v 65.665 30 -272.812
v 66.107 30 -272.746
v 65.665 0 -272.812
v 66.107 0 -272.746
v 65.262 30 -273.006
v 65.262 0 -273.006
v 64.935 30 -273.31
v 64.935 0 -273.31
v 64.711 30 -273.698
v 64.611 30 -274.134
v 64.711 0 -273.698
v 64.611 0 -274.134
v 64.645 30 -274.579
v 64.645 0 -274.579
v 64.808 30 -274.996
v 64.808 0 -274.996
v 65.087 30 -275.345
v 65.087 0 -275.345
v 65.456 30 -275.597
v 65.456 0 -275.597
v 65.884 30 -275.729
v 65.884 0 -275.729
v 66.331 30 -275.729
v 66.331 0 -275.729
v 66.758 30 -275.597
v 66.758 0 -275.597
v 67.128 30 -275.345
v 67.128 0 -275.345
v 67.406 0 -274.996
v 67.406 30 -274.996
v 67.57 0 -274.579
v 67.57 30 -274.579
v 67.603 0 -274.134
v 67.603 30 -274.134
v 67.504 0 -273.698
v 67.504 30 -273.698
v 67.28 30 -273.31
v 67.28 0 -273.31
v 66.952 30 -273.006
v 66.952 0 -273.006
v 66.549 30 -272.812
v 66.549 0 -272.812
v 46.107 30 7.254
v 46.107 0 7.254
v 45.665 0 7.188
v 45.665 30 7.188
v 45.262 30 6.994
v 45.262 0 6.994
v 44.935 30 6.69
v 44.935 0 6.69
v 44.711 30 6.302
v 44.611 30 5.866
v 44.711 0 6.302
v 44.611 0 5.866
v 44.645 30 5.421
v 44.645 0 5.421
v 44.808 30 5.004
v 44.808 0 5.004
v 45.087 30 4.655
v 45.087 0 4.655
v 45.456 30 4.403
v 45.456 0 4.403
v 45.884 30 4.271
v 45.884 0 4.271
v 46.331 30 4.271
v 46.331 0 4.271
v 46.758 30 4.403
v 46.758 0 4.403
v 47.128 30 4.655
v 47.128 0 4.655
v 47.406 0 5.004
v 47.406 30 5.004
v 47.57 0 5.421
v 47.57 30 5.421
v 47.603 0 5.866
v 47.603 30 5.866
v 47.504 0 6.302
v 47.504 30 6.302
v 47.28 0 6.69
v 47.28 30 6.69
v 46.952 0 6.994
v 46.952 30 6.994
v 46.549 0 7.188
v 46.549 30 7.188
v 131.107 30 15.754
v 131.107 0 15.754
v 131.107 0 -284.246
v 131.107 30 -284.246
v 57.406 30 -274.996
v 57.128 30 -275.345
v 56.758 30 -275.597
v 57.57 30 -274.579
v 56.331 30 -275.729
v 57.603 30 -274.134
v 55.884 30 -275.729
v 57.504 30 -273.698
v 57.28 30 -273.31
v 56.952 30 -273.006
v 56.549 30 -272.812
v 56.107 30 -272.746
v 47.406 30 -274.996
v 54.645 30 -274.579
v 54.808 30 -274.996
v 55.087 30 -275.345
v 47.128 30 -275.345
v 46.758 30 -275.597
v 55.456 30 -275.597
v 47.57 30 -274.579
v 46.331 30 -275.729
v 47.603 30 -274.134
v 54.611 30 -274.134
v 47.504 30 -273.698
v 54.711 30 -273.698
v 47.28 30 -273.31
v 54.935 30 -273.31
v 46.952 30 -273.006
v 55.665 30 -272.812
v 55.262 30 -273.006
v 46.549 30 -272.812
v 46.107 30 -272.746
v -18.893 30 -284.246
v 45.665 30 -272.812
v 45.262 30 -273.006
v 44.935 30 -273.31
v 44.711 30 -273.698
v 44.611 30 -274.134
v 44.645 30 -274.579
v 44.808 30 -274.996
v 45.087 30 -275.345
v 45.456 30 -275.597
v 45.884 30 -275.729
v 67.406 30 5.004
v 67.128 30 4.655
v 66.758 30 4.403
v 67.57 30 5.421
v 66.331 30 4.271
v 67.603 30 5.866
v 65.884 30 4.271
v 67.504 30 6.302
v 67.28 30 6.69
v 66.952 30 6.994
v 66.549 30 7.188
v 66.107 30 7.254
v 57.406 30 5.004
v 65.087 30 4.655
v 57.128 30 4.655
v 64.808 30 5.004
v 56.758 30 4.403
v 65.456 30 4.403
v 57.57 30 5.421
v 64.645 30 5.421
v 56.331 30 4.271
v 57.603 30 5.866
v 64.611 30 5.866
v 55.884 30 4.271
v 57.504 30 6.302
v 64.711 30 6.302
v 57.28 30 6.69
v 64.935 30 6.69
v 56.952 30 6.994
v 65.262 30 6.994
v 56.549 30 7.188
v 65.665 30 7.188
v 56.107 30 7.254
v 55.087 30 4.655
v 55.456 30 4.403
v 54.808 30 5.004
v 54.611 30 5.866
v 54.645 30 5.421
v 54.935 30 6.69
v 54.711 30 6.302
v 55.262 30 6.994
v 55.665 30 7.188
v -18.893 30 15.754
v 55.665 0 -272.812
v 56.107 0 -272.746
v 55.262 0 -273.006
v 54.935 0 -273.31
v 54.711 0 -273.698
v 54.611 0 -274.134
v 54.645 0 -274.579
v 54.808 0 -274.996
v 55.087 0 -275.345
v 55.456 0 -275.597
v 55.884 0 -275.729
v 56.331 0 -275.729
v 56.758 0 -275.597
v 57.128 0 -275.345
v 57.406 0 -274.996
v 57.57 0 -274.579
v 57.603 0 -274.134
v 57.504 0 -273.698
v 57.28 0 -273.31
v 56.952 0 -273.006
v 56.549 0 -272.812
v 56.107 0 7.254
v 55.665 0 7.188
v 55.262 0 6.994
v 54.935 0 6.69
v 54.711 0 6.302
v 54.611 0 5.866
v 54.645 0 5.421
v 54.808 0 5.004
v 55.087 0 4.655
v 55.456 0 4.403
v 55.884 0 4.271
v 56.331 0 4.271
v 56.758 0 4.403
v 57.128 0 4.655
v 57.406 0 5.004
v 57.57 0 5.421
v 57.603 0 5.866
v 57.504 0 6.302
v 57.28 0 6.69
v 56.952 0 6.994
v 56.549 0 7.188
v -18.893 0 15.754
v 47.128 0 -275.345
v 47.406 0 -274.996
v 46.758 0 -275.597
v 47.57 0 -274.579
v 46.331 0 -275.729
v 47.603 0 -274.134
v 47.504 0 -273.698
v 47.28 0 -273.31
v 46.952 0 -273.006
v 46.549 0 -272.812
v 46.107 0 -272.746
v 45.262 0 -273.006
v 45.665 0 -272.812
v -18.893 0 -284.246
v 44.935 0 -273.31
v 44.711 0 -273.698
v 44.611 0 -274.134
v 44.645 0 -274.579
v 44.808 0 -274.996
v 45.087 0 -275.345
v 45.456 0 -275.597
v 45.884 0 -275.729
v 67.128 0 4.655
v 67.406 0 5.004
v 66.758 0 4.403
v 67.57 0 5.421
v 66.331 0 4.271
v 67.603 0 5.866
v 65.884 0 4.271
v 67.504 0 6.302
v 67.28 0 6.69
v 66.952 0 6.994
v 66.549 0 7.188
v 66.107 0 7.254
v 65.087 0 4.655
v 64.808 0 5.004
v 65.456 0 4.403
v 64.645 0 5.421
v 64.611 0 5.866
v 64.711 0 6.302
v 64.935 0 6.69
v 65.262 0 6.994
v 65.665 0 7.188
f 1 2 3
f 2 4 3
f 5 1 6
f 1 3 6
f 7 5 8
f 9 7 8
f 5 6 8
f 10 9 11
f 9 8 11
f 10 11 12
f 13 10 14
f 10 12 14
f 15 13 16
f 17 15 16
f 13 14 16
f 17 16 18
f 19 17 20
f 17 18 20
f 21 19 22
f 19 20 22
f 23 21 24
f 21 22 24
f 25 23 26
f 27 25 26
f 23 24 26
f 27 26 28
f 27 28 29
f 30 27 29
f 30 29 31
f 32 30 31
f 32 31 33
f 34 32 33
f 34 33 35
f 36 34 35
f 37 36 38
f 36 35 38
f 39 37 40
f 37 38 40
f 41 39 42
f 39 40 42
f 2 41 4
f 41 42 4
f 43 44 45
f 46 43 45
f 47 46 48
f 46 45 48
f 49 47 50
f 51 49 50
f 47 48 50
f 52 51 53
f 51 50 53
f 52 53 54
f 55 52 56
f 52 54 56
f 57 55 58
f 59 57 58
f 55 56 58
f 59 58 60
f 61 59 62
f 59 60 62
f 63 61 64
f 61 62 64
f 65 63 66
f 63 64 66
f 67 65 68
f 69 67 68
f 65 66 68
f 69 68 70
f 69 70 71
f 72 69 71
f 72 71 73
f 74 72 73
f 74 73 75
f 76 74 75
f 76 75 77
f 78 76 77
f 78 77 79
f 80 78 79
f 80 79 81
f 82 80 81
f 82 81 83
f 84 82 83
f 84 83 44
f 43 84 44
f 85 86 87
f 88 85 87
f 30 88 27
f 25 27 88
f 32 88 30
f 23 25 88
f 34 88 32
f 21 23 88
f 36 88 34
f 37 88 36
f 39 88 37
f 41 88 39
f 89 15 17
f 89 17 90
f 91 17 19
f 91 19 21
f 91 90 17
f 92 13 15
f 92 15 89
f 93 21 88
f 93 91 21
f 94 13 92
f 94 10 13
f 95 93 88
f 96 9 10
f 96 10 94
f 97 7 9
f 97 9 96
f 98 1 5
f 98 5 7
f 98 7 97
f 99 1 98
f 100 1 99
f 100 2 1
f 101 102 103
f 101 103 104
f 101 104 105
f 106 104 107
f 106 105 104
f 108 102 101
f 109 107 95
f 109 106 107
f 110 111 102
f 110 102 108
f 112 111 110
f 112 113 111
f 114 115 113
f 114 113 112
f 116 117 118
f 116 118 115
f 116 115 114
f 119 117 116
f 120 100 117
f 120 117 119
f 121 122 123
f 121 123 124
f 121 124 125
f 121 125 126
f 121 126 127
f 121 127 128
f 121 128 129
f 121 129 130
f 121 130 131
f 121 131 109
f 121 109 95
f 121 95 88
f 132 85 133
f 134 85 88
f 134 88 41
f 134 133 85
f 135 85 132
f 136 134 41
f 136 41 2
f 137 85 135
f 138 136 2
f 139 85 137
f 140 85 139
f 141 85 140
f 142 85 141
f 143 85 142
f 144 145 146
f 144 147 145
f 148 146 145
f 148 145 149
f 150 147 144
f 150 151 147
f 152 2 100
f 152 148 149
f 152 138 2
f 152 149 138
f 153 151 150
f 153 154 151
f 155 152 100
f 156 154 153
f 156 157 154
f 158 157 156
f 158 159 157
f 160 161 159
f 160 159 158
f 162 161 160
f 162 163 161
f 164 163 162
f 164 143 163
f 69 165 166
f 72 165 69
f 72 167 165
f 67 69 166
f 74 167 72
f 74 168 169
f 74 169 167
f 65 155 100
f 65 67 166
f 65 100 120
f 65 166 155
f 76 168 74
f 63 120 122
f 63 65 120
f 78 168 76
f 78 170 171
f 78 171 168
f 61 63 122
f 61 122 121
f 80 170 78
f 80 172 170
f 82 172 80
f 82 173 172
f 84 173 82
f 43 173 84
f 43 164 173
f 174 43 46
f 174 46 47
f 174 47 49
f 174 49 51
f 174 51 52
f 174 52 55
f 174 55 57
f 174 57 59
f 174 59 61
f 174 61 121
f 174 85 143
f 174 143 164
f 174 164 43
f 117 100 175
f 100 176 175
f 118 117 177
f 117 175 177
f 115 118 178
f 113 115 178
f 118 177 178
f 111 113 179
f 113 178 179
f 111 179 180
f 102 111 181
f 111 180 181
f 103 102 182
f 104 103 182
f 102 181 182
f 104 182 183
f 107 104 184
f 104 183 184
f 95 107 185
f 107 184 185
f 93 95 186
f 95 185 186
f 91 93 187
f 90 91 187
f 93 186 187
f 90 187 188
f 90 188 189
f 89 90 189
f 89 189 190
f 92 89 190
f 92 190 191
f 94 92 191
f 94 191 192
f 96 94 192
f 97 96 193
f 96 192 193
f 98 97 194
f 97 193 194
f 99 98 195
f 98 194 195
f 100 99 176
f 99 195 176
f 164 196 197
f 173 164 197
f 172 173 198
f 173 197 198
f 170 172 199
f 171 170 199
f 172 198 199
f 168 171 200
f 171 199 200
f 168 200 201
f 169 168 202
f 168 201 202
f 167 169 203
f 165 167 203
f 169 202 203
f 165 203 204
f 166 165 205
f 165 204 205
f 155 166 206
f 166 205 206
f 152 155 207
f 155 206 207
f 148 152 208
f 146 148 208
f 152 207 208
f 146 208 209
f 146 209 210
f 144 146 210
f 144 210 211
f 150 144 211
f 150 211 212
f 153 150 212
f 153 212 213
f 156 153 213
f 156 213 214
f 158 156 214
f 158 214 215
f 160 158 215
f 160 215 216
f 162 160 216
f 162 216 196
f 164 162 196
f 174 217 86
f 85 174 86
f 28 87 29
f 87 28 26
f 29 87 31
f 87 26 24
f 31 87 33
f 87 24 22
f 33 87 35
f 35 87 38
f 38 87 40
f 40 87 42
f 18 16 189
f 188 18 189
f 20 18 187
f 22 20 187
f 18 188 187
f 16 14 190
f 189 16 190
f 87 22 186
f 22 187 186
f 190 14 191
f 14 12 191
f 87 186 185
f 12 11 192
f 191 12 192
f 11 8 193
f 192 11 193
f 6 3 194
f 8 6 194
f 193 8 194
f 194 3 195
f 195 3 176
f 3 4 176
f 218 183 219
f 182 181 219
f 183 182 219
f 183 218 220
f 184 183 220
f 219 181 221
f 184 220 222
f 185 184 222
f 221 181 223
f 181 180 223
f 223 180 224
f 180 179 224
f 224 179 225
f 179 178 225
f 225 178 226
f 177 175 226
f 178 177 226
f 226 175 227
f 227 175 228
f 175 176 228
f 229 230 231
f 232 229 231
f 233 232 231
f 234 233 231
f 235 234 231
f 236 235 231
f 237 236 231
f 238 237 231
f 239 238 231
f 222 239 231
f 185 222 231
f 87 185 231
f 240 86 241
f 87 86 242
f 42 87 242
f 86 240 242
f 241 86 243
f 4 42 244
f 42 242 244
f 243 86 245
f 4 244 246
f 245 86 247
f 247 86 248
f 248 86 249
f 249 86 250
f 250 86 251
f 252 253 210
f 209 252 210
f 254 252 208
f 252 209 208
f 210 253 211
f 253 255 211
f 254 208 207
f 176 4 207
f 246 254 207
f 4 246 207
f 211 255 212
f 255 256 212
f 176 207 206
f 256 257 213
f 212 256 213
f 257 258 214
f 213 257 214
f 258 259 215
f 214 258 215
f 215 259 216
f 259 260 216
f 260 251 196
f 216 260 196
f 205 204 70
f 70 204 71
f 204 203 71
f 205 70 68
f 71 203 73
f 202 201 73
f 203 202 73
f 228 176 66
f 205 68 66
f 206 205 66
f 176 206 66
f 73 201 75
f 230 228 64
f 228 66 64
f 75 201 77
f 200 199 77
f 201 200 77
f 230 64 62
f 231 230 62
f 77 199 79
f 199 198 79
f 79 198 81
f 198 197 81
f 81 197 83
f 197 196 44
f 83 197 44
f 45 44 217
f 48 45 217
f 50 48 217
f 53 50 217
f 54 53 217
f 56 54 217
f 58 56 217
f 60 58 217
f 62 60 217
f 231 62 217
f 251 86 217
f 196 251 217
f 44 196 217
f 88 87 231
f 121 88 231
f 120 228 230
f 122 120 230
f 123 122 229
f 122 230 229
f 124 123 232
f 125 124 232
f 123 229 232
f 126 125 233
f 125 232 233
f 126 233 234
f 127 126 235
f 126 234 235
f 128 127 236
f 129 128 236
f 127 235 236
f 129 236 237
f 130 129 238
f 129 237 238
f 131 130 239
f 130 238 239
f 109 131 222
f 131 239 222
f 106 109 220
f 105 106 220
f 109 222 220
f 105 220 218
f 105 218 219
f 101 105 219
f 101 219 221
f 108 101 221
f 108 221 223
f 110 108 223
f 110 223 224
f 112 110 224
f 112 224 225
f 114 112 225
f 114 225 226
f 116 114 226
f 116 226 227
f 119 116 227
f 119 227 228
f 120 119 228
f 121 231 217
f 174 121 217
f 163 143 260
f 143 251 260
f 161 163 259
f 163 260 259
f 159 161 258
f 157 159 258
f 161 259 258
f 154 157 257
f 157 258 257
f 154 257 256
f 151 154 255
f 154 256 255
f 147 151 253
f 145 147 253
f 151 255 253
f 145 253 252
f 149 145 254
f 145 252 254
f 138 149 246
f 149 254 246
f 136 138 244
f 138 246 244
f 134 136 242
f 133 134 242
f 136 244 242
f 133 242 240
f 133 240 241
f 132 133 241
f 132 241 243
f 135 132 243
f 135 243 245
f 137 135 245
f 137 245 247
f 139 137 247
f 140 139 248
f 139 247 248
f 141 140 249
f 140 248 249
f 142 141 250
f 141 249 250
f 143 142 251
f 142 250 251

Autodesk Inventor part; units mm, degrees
ref_plane "YZ Plane" through (0, 0, 0) normal (1, 0, 0) x (0, 1, 0)
ref_plane "XZ Plane" through (0, 0, 0) normal (0, 1, 0) x (-1, 0, 0)
ref_plane "XY Plane" through (0, 0, 0) normal (0, 0, 1) x (1, 0, 0)
sketch "スケッチ1" plane through (0, 0, 0) normal (0, 1, 0) x (-1, 0, 0)
  line L0 (18.8927, 15.7544) -> (-131.1073, 15.7544)
  line L1 (-131.1073, 15.7544) -> (-131.1073, -284.2456)
  line L2 (-131.1073, -284.2456) -> (18.8927, -284.2456)
  line L3 (18.8927, -284.2456) -> (18.8927, 15.7544)
  point P0 (0, 0)
  dimension "d0" = 150
  dimension "d1" = 300
extrude "押し出し1" add sketch "スケッチ1" along normal blind 30
sketch "スケッチ2" plane through (0, 30, 0) normal (0, 1, 0) x (1, 0, 0)
  point P0 (0, 0)
sketch "スケッチ3" plane through (0, 30, 0) normal (0, 1, 0) x (1, 0, 0)
  circle A0 centre (56.1073, -5.7544) radius 1.5
  line L0 (-18.8927, 284.2456) -> (-18.8927, -15.7544) projected
  line L1 (-18.8927, -15.7544) -> (131.1073, -15.7544) projected
  circle A1 centre (46.1073, -5.7544) radius 1.5
  circle A2 centre (66.1073, -5.7544) radius 1.5
  point P0 (0, 0)
  dimension "d4" = 3
  dimension "d5" = 75
  dimension "d6" = 10
  dimension "d7" = 3
  dimension "d8" = 3
  dimension "d9" = 10
  dimension "d10" = 10
sketch "スケッチ4" plane through (0, 30, 0) normal (0, 1, 0) x (1, 0, 0)
  circle A0 centre (56.1073, 274.2456) radius 1.5
  line L0 (131.1073, -15.7544) -> (131.1073, 284.2456) projected
  line L1 (131.1073, 284.2456) -> (-18.8927, 284.2456) projected
  circle A1 centre (46.1073, 274.2456) radius 1.5
  circle A2 centre (66.1073, 274.2456) radius 1.5
  point P0 (0, 0)
  dimension "d11" = 3
  dimension "d12" = 75
  dimension "d13" = 10
  dimension "d14" = 3
  dimension "d15" = 3
  dimension "d16" = 10
  dimension "d17" = 10
hole "穴1" at (46.1073, 30, 5.7544) at (56.1073, 30, 5.7544) at (66.1073, 30, 5.7544) direction (0, -1, 0) diameter 3 depth 30
hole "穴2" at (66.1073, 30, -274.2456) at (56.1073, 30, -274.2456) at (46.1073, 30, -274.2456) direction (0, -1, 0) diameter 3 depth 30
equation "\"BendRadius\" = Thickness"
equation "\"BendReliefWidth\" = Thickness"
equation "\"BendReliefDepth\" = 0.5 * Thickness"
equation "\"CornerReliefSize\" = 4 * Thickness"
equation "\"MinimumRemnant\" = 2 * Thickness"
equation "\"TransitionRadius\" = BendRadius"
equation "\"JacobiRadiusSize\" = BendRadius"
equation "\"GapSize\" = Thickness"
equation "\"Thickness\" = 0.5"
properties part number "nhk19" material "木材 (オーク)"
